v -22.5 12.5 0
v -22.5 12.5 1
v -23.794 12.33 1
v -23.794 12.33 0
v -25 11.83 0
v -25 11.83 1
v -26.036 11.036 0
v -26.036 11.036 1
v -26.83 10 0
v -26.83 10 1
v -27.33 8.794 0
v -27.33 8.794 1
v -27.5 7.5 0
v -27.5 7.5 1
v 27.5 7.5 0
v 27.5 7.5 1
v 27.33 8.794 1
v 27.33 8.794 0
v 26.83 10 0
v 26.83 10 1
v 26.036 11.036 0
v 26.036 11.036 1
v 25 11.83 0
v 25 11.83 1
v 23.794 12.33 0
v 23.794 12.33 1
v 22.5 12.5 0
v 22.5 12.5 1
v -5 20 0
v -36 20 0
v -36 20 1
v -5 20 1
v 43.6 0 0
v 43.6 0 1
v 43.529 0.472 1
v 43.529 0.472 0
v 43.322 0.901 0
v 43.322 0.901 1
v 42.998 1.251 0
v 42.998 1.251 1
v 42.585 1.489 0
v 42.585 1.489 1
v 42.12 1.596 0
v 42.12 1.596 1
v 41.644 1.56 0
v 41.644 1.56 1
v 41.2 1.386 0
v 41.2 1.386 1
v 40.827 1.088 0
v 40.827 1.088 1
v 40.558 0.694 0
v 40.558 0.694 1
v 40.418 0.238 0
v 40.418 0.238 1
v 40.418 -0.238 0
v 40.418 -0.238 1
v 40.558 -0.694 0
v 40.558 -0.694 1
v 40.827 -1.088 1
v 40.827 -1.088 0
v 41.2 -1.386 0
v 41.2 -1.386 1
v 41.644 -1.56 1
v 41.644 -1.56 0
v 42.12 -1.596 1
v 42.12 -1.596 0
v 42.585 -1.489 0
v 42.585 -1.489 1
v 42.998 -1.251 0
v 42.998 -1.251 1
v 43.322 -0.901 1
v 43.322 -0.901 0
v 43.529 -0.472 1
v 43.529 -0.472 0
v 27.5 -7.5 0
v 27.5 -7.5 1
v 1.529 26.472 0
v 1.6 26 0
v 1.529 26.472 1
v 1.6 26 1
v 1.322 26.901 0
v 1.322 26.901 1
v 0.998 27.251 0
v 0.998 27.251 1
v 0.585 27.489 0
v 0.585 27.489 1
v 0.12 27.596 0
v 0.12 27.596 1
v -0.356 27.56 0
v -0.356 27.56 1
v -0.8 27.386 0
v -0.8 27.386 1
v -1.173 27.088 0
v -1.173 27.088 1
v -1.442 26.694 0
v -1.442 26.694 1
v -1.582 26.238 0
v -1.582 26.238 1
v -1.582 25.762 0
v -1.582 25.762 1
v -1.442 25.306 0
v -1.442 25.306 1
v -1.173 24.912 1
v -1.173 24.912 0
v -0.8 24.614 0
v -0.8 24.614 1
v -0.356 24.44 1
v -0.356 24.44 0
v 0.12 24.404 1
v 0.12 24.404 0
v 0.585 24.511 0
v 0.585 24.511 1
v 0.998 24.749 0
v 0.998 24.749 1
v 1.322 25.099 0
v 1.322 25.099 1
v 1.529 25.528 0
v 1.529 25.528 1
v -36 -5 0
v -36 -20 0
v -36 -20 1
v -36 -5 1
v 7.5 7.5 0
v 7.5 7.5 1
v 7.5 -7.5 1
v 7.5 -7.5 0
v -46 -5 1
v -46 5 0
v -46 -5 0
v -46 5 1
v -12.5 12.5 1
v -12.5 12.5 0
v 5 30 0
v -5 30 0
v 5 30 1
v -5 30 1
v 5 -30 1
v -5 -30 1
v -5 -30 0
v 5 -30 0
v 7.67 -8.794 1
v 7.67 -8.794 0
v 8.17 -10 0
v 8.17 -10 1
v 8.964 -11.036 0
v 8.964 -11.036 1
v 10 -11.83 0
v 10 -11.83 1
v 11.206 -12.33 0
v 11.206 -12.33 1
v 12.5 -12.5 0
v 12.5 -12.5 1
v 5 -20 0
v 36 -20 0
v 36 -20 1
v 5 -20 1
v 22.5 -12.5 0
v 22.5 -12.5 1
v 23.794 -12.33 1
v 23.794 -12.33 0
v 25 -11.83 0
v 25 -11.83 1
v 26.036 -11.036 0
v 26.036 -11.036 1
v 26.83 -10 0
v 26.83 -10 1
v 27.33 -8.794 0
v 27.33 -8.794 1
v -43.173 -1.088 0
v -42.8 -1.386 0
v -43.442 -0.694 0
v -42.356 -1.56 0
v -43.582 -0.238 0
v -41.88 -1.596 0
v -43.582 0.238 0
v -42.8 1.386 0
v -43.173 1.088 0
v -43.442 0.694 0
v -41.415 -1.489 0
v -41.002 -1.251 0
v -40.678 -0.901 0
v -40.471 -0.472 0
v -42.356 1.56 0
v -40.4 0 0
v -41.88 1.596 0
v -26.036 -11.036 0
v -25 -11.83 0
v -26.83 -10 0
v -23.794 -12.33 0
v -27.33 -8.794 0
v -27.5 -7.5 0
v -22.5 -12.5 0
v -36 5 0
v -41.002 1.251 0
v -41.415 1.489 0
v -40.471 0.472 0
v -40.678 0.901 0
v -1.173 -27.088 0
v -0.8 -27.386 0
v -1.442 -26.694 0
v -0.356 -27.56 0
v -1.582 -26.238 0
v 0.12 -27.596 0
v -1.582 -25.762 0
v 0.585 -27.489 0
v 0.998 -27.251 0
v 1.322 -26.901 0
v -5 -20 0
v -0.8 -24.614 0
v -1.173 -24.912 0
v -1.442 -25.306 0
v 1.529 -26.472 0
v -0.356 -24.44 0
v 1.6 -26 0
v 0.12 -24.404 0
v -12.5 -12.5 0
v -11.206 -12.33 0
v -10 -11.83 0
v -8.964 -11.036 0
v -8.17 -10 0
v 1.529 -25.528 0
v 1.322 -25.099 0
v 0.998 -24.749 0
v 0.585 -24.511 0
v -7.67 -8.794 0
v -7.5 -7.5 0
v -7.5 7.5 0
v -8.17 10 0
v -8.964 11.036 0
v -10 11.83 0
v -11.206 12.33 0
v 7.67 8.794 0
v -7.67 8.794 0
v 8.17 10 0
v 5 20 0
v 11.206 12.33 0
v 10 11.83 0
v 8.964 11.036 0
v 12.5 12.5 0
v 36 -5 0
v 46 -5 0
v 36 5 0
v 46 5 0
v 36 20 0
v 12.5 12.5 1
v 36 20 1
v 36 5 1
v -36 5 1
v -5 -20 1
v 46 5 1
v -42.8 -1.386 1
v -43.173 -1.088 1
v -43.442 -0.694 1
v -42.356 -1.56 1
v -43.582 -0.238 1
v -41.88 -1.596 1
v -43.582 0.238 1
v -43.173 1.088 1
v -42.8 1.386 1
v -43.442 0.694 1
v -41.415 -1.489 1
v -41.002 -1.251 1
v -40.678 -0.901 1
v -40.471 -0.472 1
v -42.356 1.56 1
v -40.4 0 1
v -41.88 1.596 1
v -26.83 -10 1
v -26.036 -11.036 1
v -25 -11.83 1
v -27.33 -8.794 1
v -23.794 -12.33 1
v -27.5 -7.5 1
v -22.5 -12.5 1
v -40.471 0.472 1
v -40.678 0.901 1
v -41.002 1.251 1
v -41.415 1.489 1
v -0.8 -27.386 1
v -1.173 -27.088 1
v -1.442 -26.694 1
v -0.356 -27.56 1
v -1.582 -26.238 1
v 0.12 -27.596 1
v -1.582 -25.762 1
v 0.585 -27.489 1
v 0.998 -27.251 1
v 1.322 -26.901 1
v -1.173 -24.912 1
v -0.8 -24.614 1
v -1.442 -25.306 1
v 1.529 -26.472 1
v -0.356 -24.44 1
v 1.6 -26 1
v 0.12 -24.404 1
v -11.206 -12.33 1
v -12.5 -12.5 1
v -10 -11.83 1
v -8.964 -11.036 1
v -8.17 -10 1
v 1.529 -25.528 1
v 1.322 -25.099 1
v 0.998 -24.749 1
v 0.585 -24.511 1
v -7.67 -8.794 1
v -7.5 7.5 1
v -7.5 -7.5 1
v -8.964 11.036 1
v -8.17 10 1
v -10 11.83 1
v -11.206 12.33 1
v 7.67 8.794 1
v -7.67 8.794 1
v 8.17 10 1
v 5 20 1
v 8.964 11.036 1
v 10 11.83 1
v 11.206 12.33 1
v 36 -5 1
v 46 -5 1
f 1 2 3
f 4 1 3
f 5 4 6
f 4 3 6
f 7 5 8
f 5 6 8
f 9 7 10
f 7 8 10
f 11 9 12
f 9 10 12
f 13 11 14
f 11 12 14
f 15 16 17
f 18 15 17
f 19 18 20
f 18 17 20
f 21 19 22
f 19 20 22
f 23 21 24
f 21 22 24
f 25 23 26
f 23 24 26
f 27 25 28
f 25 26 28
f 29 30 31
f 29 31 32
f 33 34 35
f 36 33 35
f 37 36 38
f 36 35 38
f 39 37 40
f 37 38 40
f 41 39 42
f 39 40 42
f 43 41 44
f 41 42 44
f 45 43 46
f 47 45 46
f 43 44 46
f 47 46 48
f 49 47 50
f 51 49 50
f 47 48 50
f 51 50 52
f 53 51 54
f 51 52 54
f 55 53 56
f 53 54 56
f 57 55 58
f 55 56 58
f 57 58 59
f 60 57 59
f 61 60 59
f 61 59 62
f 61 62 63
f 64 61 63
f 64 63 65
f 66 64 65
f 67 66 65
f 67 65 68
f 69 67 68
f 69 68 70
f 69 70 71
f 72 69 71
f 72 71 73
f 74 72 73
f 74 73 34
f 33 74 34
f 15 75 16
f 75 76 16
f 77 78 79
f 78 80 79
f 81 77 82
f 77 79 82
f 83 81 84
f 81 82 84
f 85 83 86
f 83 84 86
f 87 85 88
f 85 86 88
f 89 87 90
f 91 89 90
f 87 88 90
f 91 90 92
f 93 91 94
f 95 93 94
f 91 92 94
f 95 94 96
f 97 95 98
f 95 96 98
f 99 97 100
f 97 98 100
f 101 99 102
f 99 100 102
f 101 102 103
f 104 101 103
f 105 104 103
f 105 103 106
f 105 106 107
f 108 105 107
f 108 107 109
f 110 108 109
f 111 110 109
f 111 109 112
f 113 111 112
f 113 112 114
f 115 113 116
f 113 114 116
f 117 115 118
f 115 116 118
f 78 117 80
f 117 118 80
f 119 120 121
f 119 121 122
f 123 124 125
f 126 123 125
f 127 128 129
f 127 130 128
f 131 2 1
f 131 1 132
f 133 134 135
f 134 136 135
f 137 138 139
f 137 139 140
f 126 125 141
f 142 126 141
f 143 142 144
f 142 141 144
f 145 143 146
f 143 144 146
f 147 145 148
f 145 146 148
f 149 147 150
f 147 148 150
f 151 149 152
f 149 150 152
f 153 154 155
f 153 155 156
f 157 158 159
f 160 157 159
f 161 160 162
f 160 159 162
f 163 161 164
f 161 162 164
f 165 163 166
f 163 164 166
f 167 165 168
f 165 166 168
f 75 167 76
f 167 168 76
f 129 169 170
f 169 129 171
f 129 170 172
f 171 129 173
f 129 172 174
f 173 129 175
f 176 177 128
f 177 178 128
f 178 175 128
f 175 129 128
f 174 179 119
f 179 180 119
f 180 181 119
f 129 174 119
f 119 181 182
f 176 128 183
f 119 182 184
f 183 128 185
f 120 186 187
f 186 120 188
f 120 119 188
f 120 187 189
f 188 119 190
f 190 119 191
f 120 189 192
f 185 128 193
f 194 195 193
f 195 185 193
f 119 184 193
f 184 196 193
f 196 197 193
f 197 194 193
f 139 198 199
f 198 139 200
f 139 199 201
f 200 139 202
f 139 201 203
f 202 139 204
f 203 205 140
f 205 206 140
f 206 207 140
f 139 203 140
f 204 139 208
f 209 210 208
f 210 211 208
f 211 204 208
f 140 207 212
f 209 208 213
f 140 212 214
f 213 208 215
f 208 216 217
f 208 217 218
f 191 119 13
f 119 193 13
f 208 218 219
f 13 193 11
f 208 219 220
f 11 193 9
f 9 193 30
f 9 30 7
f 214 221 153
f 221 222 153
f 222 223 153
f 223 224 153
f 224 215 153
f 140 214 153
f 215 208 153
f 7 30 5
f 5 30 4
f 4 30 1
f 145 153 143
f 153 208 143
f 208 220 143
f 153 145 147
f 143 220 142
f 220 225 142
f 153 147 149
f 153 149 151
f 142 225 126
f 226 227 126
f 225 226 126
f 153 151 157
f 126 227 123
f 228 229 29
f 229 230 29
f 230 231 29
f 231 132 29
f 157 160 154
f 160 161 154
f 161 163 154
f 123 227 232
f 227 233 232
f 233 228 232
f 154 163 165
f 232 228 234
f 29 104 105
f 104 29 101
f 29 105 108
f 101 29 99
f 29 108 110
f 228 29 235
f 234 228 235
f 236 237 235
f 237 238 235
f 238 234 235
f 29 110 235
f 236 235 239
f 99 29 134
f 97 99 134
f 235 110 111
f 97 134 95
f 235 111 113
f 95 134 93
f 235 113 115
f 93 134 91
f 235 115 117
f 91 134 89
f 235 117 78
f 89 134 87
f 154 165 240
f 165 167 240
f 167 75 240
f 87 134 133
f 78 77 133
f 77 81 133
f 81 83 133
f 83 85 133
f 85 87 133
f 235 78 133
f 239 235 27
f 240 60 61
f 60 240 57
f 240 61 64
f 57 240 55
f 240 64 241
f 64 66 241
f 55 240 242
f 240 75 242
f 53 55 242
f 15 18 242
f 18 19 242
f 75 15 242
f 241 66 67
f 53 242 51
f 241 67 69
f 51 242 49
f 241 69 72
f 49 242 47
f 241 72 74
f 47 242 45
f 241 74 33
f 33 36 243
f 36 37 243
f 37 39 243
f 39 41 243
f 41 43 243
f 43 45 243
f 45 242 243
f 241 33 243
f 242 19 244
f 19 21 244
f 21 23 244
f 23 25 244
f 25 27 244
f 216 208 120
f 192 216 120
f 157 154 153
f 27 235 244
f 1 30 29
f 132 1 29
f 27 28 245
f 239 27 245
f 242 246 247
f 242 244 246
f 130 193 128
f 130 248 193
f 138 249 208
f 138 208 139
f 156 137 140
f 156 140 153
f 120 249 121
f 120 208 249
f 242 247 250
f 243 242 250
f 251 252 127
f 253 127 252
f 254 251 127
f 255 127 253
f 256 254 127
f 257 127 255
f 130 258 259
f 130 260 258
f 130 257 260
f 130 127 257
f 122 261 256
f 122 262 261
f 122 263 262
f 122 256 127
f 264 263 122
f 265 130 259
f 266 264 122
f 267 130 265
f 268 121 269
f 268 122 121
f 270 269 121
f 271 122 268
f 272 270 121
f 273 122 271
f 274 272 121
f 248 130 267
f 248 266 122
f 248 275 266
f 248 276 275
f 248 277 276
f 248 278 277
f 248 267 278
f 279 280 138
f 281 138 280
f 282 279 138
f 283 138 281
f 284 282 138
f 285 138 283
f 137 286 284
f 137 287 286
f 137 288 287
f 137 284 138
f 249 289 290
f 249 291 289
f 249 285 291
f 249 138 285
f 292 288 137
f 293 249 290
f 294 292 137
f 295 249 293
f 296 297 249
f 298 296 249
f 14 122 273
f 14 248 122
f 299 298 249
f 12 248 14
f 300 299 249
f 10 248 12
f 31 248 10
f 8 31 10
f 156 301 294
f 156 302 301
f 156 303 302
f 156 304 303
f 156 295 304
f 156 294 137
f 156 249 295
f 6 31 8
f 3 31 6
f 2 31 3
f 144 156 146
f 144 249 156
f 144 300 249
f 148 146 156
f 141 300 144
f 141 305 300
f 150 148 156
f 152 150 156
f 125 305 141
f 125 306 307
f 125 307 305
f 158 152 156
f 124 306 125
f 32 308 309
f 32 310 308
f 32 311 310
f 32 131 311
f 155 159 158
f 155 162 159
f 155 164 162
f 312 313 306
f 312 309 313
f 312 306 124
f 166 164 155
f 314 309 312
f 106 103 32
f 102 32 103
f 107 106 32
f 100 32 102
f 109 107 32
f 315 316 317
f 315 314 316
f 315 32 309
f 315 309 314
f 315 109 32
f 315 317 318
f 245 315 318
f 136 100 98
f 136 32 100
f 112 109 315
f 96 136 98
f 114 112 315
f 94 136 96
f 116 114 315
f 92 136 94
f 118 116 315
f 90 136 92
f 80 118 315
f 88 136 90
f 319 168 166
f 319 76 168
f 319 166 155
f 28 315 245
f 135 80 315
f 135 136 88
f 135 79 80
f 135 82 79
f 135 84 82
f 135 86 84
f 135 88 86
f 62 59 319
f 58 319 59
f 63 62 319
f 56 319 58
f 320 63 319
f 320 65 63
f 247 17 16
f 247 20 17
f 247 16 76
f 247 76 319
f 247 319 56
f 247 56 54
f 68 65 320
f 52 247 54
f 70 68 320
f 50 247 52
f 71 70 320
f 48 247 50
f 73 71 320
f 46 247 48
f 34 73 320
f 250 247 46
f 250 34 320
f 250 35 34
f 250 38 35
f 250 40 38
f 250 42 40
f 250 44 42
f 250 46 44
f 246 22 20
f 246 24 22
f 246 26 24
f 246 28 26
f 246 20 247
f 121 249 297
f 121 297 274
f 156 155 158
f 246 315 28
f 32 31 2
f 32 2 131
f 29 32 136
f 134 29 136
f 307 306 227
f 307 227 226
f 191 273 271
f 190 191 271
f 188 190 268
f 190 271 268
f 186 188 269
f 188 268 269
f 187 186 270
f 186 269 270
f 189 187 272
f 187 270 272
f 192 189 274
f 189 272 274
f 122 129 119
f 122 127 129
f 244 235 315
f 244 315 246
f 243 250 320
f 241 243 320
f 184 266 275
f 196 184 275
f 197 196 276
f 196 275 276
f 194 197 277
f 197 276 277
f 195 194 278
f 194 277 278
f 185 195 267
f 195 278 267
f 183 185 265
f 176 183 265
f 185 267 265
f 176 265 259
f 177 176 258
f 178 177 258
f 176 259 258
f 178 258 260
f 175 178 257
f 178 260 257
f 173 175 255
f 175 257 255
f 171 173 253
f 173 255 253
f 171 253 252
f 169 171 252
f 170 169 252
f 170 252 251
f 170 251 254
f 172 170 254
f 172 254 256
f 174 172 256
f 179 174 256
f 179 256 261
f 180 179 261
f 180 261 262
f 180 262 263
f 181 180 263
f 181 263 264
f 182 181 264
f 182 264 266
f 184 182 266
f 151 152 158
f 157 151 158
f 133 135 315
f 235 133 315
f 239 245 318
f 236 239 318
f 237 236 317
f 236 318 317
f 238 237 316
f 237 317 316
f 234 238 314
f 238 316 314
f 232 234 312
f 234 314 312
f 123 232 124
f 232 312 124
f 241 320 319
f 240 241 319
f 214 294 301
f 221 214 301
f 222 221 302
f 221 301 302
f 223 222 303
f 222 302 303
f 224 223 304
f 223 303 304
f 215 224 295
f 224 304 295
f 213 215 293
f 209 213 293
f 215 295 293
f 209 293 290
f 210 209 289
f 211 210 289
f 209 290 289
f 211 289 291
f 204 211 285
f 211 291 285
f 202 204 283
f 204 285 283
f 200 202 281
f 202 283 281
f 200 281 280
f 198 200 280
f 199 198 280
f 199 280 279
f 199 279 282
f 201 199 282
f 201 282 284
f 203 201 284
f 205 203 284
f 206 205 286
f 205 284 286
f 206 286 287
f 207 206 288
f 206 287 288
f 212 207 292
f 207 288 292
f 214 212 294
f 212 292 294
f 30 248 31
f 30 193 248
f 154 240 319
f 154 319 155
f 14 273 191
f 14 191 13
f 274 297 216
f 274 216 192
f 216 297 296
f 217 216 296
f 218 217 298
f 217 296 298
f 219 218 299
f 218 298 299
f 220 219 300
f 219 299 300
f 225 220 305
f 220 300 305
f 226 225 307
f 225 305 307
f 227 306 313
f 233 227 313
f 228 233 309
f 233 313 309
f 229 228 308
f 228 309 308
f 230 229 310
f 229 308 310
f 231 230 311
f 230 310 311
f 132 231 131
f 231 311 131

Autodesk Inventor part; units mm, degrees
ref_plane "YZ Plane" through (0, 0, 0) normal (1, 0, 0) x (0, 1, 0)
ref_plane "XZ Plane" through (0, 0, 0) normal (0, 1, 0) x (-1, 0, 0)
ref_plane "XY Plane" through (0, 0, 0) normal (0, 0, 1) x (1, 0, 0)
sketch "Sketch3" plane through (0, 0, 1) normal (0, 0, 1) x (1, 0, 0)
  line L0 (-22.5, 27.5) -> (-12.5, 27.5)
  line L1 (-7.5, 22.5) -> (-7.5, 12.5)
  line L2 (-12.5, 7.5) -> (-22.5, 7.5)
  line L3 (-27.5, 12.5) -> (-27.5, 22.5)
  line L4 (-27.5, 27.5) -> (-7.5, 7.5) construction
  line L5 (-7.5, 27.5) -> (-27.5, 7.5) construction
  line L6 (-11.1923, 0) -> (11.1923, 0)
  line L7 (0, 8.4231) -> (0, -8.4231)
  arc A0 (-22.5, 27.5) -> (-27.5, 22.5) centre (-22.5, 22.5) ccw
  arc A1 (-7.5, 22.5) -> (-12.5, 27.5) centre (-12.5, 22.5) ccw
  arc A2 (-12.5, 7.5) -> (-7.5, 12.5) centre (-12.5, 12.5) ccw
  arc A3 (-27.5, 12.5) -> (-22.5, 7.5) centre (-22.5, 12.5) ccw
  line L8 (22.5, 27.5) -> (12.5, 27.5)
  line L9 (7.5, 22.5) -> (7.5, 12.5)
  line L10 (12.5, 7.5) -> (22.5, 7.5)
  line L11 (27.5, 12.5) -> (27.5, 22.5)
  line L12 (27.5, 27.5) -> (7.5, 7.5) construction
  line L13 (7.5, 27.5) -> (27.5, 7.5) construction
  arc A4 (27.5, 22.5) -> (22.5, 27.5) centre (22.5, 22.5) ccw
  arc A5 (12.5, 27.5) -> (7.5, 22.5) centre (12.5, 22.5) ccw
  arc A6 (7.5, 12.5) -> (12.5, 7.5) centre (12.5, 12.5) ccw
  arc A7 (22.5, 7.5) -> (27.5, 12.5) centre (22.5, 12.5) ccw
  line L14 (-22.5, -27.5) -> (-12.5, -27.5)
  line L15 (-7.5, -22.5) -> (-7.5, -12.5)
  line L16 (-12.5, -7.5) -> (-22.5, -7.5)
  line L17 (-27.5, -12.5) -> (-27.5, -22.5)
  line L18 (-27.5, -27.5) -> (-7.5, -7.5) construction
  line L19 (-7.5, -27.5) -> (-27.5, -7.5) construction
  arc A8 (-27.5, -22.5) -> (-22.5, -27.5) centre (-22.5, -22.5) ccw
  arc A9 (-12.5, -27.5) -> (-7.5, -22.5) centre (-12.5, -22.5) ccw
  arc A10 (-7.5, -12.5) -> (-12.5, -7.5) centre (-12.5, -12.5) ccw
  arc A11 (-22.5, -7.5) -> (-27.5, -12.5) centre (-22.5, -12.5) ccw
  line L20 (7.5, -22.5) -> (7.5, -12.5)
  arc A12 (12.5, -7.5) -> (7.5, -12.5) centre (12.5, -12.5) ccw
  arc A13 (7.5, -22.5) -> (12.5, -27.5) centre (12.5, -22.5) ccw
  line L21 (22.5, -27.5) -> (12.5, -27.5)
  line L22 (12.5, -7.5) -> (22.5, -7.5)
  line L23 (27.5, -27.5) -> (7.5, -7.5) construction
  line L24 (7.5, -27.5) -> (27.5, -7.5) construction
  arc A14 (27.5, -12.5) -> (22.5, -7.5) centre (22.5, -12.5) ccw
  line L25 (27.5, -12.5) -> (27.5, -22.5)
  arc A15 (22.5, -27.5) -> (27.5, -22.5) centre (22.5, -22.5) ccw
  point P0 (0, 0)
  point P1 (-17.5, 17.5)
  point P2 (0, 0)
  point P3 (17.5, 17.5)
  point P4 (-17.5, -17.5)
  point P5 (17.5, -17.5)
  dimension "d29" = 20
  dimension "d30" = 15
  dimension "d31" = 15
  dimension "d32" = 20
  dimension "d33" = 5
sketch "Sketch1" plane through (0, 0, 0) normal (0, 0, 1) x (1, 0, 0)
  line L0 (-36, 20) -> (36, 20)
  line L1 (36, 20) -> (36, -20)
  line L2 (36, -20) -> (-36, -20)
  line L3 (-36, -20) -> (-36, 20)
  line L4 (-36, 20) -> (36, -20) construction
  line L5 (36, 20) -> (-36, -20) construction
  point P0 (0, 0)
  dimension "d0" = 40
  dimension "d1" = 72
extrude "Plate1" add sketch "Sketch1" along normal blind 1
sketch "Sketch2" plane through (0, 0, 1) normal (0, 0, 1) x (1, 0, 0)
  line L0 (-36, 20) -> (36, 20)
  line L1 (-46, -5) -> (-36, -5)
  line L2 (-36, -5) -> (-36, 5)
  line L3 (-36, 5) -> (-46, 5)
  line L4 (-46, 5) -> (-46, -5)
  line L5 (-46, -5) -> (-36, 5) construction
  line L6 (-36, -5) -> (-46, 5) construction
  line L7 (0, 0) -> (0, 7.0571)
  line L8 (0, 0) -> (6.6312, 0)
  line L9 (-36, -20) -> (-36, 20)
  line L10 (46, -5) -> (36, -5)
  line L11 (36, -5) -> (36, 5)
  line L12 (36, 5) -> (46, 5)
  line L13 (46, 5) -> (46, -5)
  line L14 (46, -5) -> (36, 5) construction
  line L15 (36, -5) -> (46, 5) construction
  circle A0 centre (-42, 0) radius 1.6
  circle A1 centre (42, 0) radius 1.6
  line L16 (36, -20) -> (-36, -20)
  line L17 (-5, -30) -> (5, -30)
  line L18 (5, -30) -> (5, -20)
  line L19 (5, -20) -> (-5, -20)
  line L20 (-5, -20) -> (-5, -30)
  line L21 (-5, -30) -> (5, -20) construction
  line L22 (5, -30) -> (-5, -20) construction
  circle A2 centre (0, -26) radius 1.6
  line L23 (-5, 30) -> (5, 30)
  line L24 (5, 30) -> (5, 20)
  line L25 (5, 20) -> (-5, 20)
  line L26 (-5, 20) -> (-5, 30)
  line L27 (-5, 30) -> (5, 20) construction
  line L28 (5, 30) -> (-5, 20) construction
  circle A3 centre (0, 26) radius 1.6
  point P0 (-41, 0)
  point P1 (41, 0)
  point P2 (0, -25)
  point P3 (0, 25)
  dimension "d5" = 10
  dimension "d6" = 10
  dimension "d10" = 3.2
  dimension "d12" = 4
  dimension "d18" = 3.2
  dimension "d19" = 10
  dimension "d20" = 10
  dimension "d21" = 4
sheet face with bend "Face2" sketch "Sketch2" thickness 1 toward (0, 0, -1) bend radius 1
bend "Bend1"
sketch "Sketch4" plane through (0, 0, 1) normal (0, 0, 1) x (1, 0, 0)
  line L0 (-22.5, 12.5) -> (-12.5, 12.5)
  line L1 (-7.5, 7.5) -> (-7.5, -7.5)
  line L2 (-12.5, -12.5) -> (-22.5, -12.5)
  line L3 (-27.5, -7.5) -> (-27.5, 7.5)
  line L4 (-27.5, 12.5) -> (-7.5, -12.5) construction
  line L5 (-7.5, 12.5) -> (-27.5, -12.5) construction
  line L6 (0, 16.1761) -> (0, -17.081)
  arc A0 (-22.5, 12.5) -> (-27.5, 7.5) centre (-22.5, 7.5) ccw
  arc A1 (-7.5, 7.5) -> (-12.5, 12.5) centre (-12.5, 7.5) ccw
  arc A2 (-12.5, -12.5) -> (-7.5, -7.5) centre (-12.5, -7.5) ccw
  arc A3 (-27.5, -7.5) -> (-22.5, -12.5) centre (-22.5, -7.5) ccw
  line L7 (22.5, 12.5) -> (12.5, 12.5)
  line L8 (7.5, 7.5) -> (7.5, -7.5)
  line L9 (12.5, -12.5) -> (22.5, -12.5)
  line L10 (27.5, -7.5) -> (27.5, 7.5)
  line L11 (27.5, 12.5) -> (7.5, -12.5) construction
  line L12 (7.5, 12.5) -> (27.5, -12.5) construction
  arc A4 (27.5, 7.5) -> (22.5, 12.5) centre (22.5, 7.5) ccw
  arc A5 (12.5, 12.5) -> (7.5, 7.5) centre (12.5, 7.5) ccw
  arc A6 (7.5, -7.5) -> (12.5, -12.5) centre (12.5, -7.5) ccw
  arc A7 (22.5, -12.5) -> (27.5, -7.5) centre (22.5, -7.5) ccw
  point P0 (0, 0)
  point P1 (-17.5, 0)
  point P2 (17.5, 0)
  dimension "d36" = 20
  dimension "d37" = 25
  dimension "d38" = 5
  dimension "d39" = 15
extrude "Cut2" cut sketch "Sketch4" against normal blind 1
equation "\"d40\" = 厚度"
equation "\"d2\" = 厚度"
equation "\"d13\" = 折彎半徑"
equation "\"d14\" = 折彎離隙寬度"
equation "\"d16\" = 最小剩餘"
equation "\"d15\" = 折彎離隙深度"
equation "\"d17\" = 轉移半徑"
equation "\"折彎半徑\" = 厚度"
equation "\"折彎離隙寬度\" = 厚度"
equation "\"折彎離隙深度\" = 0.5 * 厚度"
equation "\"轉角離隙大小\" = 4 * 厚度"
equation "\"最小剩餘\" = 2 * 厚度"
equation "\"轉移半徑\" = 折彎半徑"
equation "\"Jacobi半徑大小\" = 折彎半徑"
equation "\"間隙大小\" = 厚度"
equation "\"厚度\" = 1"
properties part number "battery_box_5V_top" material "Aluminum"
